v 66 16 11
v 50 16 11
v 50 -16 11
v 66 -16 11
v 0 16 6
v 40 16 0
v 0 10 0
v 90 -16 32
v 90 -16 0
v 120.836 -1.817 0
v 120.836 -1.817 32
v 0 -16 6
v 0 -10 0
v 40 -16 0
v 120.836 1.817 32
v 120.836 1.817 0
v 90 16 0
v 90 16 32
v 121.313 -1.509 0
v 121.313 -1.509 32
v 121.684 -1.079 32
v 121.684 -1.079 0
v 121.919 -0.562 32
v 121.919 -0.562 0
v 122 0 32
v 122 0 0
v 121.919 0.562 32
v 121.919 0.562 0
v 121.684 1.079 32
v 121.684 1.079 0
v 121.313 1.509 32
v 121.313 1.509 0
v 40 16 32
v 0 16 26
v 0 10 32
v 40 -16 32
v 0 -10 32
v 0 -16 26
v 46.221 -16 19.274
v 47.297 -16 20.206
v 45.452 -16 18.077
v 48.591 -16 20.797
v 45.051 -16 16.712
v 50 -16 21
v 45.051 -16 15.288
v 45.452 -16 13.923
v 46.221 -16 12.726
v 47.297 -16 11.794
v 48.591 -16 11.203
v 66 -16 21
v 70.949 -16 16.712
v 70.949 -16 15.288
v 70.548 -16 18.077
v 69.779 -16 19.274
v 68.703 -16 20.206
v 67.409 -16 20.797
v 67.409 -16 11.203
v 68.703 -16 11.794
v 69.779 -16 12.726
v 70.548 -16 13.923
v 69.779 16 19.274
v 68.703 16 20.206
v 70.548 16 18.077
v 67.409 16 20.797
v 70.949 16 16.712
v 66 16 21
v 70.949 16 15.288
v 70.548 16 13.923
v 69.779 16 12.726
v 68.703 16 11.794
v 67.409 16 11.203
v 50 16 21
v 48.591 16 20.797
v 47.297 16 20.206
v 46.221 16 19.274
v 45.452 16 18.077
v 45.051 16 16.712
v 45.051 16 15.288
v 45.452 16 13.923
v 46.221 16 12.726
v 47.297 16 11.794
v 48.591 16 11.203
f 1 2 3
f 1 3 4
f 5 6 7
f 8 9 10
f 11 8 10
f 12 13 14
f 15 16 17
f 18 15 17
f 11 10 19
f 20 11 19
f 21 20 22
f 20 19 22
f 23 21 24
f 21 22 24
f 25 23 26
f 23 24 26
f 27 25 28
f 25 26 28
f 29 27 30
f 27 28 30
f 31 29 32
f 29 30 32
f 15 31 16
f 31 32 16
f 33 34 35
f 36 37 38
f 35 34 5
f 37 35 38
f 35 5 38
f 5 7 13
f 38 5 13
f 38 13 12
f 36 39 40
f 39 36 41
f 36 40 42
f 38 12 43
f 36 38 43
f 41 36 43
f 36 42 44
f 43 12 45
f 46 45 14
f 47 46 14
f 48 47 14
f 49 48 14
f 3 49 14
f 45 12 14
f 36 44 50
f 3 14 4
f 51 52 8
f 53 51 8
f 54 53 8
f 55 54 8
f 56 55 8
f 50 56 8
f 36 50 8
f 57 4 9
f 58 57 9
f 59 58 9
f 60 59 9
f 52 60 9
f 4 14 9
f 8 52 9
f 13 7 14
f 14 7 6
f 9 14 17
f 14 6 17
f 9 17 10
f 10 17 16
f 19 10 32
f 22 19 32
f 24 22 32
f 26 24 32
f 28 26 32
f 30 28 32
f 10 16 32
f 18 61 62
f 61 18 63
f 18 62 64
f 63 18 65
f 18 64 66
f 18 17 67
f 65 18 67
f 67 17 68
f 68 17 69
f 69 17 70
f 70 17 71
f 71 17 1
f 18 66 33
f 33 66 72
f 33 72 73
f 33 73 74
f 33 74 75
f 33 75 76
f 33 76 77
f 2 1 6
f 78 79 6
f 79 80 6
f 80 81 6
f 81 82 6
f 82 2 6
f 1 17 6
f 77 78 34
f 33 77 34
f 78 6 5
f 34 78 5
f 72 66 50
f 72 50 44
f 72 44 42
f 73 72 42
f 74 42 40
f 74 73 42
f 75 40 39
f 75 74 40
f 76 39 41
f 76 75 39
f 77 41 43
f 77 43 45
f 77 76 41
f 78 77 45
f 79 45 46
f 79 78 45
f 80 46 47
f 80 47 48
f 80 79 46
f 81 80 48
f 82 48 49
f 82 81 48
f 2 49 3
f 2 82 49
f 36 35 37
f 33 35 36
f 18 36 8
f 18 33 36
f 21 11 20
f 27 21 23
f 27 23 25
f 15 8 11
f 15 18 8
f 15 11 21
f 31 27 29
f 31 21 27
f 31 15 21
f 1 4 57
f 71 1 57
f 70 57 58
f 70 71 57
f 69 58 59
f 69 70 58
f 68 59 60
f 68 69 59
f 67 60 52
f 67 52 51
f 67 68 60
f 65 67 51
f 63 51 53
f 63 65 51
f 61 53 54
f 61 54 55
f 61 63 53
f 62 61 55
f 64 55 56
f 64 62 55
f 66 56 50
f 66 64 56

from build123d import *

# Parameters (mm, degrees)
BOSS_EXTRUDE1_DEPTH = 32
CUT_EXTRUDE1_DEPTH  = 32
CUT_EXTRUDE2_DEPTH  = 32
CUT_EXTRUDE3_DEPTH  = 32
CUT_EXTRUDE5_DEPTH  = 32
CUT_EXTRUDE6_DEPTH  = 32


with BuildPart() as part:
    # Sketch1 → Boss-Extrude1 (new body)
    with BuildSketch(Plane.XY):
        with BuildLine():
            Line((0, 16), (0, -16))
            Line((0, -16), (90, -16))
            Line((90, -16), (120.835740498, -1.817013434))
            ThreePointArc((120.835740498, -1.817013434), (122, 0), (120.835740498, 1.817013434))
            Line((120.835740498, 1.817013434), (90, 16))
            Line((90, 16), (0, 16))
        make_face()
    extrude(amount=BOSS_EXTRUDE1_DEPTH)

    # Sketch2 → Cut-Extrude1 (cut)
    with BuildSketch(Plane(origin=(0, 16, 0), x_dir=(1, 0, 0), z_dir=(0, 1, 0))):
        with BuildLine():
            Line((50, -11), (66, -11))
            ThreePointArc((66, -11), (71, -16), (66, -21))
            Line((66, -21), (50, -21))
            ThreePointArc((50, -21), (45, -16), (50, -11))
        make_face()
    extrude(amount=-CUT_EXTRUDE1_DEPTH, mode=Mode.SUBTRACT)

    # Sketch5 → Cut-Extrude2 (cut)
    with BuildSketch(Plane(origin=(-3.114956737, 20.766378245, 20.766378245), x_dir=(0.9944220203272567, 0.07458165152454437, 0.0745816515245444), z_dir=(-0.10547438309019469, 0.70316255393463, 0.70316255393463))):
        Polygon((3.132429364, -7.071067812), (3.132429364, -15.556349186), (43.356800086, -11.313708499), align=None)
    extrude(amount=CUT_EXTRUDE2_DEPTH, mode=Mode.SUBTRACT)

    # Sketch11 → Cut-Extrude3 (cut)
    with BuildSketch(Plane(origin=(-3.114956737, -20.766378245, 20.766378245), x_dir=(0.9944220203272567, -0.07458165152454421, 0.07458165152454423), z_dir=(-0.10547438309019447, -0.7031625539346299, 0.7031625539346302))):
        Polygon((43.356800086, 11.313708499), (3.132429364, 15.556349186), (3.132429364, 7.071067812), align=None)
    extrude(amount=CUT_EXTRUDE3_DEPTH, mode=Mode.SUBTRACT)

    # Sketch12 → Cut-Extrude5 (cut)
    with BuildSketch(Plane(origin=(-0.741656366, -4.944375773, -4.944375773), x_dir=(-0.9944220203272567, 0.07458165152454425, 0.07458165152454425), z_dir=(-0.10547438309019451, -0.70316255393463, -0.70316255393463))):
        Polygon((-40.970187237, -11.313708499), (-0.745816515, -7.071067812), (-0.745816515, -15.556349186), align=None)
    extrude(amount=CUT_EXTRUDE5_DEPTH, mode=Mode.SUBTRACT)

    # Sketch13 → Cut-Extrude6 (cut)
    with BuildSketch(Plane(origin=(-0.741656366, 4.944375773, -4.944375773), x_dir=(0.9944220203272567, 0.07458165152454421, -0.07458165152454421), z_dir=(0.10547438309019444, -0.70316255393463, 0.70316255393463))):
        Polygon((40.970187237, 11.313708499), (0.745816515, 7.071067812), (0.745816515, 15.556349186), align=None)
    extrude(amount=-CUT_EXTRUDE6_DEPTH, mode=Mode.SUBTRACT)


solid = part.part
